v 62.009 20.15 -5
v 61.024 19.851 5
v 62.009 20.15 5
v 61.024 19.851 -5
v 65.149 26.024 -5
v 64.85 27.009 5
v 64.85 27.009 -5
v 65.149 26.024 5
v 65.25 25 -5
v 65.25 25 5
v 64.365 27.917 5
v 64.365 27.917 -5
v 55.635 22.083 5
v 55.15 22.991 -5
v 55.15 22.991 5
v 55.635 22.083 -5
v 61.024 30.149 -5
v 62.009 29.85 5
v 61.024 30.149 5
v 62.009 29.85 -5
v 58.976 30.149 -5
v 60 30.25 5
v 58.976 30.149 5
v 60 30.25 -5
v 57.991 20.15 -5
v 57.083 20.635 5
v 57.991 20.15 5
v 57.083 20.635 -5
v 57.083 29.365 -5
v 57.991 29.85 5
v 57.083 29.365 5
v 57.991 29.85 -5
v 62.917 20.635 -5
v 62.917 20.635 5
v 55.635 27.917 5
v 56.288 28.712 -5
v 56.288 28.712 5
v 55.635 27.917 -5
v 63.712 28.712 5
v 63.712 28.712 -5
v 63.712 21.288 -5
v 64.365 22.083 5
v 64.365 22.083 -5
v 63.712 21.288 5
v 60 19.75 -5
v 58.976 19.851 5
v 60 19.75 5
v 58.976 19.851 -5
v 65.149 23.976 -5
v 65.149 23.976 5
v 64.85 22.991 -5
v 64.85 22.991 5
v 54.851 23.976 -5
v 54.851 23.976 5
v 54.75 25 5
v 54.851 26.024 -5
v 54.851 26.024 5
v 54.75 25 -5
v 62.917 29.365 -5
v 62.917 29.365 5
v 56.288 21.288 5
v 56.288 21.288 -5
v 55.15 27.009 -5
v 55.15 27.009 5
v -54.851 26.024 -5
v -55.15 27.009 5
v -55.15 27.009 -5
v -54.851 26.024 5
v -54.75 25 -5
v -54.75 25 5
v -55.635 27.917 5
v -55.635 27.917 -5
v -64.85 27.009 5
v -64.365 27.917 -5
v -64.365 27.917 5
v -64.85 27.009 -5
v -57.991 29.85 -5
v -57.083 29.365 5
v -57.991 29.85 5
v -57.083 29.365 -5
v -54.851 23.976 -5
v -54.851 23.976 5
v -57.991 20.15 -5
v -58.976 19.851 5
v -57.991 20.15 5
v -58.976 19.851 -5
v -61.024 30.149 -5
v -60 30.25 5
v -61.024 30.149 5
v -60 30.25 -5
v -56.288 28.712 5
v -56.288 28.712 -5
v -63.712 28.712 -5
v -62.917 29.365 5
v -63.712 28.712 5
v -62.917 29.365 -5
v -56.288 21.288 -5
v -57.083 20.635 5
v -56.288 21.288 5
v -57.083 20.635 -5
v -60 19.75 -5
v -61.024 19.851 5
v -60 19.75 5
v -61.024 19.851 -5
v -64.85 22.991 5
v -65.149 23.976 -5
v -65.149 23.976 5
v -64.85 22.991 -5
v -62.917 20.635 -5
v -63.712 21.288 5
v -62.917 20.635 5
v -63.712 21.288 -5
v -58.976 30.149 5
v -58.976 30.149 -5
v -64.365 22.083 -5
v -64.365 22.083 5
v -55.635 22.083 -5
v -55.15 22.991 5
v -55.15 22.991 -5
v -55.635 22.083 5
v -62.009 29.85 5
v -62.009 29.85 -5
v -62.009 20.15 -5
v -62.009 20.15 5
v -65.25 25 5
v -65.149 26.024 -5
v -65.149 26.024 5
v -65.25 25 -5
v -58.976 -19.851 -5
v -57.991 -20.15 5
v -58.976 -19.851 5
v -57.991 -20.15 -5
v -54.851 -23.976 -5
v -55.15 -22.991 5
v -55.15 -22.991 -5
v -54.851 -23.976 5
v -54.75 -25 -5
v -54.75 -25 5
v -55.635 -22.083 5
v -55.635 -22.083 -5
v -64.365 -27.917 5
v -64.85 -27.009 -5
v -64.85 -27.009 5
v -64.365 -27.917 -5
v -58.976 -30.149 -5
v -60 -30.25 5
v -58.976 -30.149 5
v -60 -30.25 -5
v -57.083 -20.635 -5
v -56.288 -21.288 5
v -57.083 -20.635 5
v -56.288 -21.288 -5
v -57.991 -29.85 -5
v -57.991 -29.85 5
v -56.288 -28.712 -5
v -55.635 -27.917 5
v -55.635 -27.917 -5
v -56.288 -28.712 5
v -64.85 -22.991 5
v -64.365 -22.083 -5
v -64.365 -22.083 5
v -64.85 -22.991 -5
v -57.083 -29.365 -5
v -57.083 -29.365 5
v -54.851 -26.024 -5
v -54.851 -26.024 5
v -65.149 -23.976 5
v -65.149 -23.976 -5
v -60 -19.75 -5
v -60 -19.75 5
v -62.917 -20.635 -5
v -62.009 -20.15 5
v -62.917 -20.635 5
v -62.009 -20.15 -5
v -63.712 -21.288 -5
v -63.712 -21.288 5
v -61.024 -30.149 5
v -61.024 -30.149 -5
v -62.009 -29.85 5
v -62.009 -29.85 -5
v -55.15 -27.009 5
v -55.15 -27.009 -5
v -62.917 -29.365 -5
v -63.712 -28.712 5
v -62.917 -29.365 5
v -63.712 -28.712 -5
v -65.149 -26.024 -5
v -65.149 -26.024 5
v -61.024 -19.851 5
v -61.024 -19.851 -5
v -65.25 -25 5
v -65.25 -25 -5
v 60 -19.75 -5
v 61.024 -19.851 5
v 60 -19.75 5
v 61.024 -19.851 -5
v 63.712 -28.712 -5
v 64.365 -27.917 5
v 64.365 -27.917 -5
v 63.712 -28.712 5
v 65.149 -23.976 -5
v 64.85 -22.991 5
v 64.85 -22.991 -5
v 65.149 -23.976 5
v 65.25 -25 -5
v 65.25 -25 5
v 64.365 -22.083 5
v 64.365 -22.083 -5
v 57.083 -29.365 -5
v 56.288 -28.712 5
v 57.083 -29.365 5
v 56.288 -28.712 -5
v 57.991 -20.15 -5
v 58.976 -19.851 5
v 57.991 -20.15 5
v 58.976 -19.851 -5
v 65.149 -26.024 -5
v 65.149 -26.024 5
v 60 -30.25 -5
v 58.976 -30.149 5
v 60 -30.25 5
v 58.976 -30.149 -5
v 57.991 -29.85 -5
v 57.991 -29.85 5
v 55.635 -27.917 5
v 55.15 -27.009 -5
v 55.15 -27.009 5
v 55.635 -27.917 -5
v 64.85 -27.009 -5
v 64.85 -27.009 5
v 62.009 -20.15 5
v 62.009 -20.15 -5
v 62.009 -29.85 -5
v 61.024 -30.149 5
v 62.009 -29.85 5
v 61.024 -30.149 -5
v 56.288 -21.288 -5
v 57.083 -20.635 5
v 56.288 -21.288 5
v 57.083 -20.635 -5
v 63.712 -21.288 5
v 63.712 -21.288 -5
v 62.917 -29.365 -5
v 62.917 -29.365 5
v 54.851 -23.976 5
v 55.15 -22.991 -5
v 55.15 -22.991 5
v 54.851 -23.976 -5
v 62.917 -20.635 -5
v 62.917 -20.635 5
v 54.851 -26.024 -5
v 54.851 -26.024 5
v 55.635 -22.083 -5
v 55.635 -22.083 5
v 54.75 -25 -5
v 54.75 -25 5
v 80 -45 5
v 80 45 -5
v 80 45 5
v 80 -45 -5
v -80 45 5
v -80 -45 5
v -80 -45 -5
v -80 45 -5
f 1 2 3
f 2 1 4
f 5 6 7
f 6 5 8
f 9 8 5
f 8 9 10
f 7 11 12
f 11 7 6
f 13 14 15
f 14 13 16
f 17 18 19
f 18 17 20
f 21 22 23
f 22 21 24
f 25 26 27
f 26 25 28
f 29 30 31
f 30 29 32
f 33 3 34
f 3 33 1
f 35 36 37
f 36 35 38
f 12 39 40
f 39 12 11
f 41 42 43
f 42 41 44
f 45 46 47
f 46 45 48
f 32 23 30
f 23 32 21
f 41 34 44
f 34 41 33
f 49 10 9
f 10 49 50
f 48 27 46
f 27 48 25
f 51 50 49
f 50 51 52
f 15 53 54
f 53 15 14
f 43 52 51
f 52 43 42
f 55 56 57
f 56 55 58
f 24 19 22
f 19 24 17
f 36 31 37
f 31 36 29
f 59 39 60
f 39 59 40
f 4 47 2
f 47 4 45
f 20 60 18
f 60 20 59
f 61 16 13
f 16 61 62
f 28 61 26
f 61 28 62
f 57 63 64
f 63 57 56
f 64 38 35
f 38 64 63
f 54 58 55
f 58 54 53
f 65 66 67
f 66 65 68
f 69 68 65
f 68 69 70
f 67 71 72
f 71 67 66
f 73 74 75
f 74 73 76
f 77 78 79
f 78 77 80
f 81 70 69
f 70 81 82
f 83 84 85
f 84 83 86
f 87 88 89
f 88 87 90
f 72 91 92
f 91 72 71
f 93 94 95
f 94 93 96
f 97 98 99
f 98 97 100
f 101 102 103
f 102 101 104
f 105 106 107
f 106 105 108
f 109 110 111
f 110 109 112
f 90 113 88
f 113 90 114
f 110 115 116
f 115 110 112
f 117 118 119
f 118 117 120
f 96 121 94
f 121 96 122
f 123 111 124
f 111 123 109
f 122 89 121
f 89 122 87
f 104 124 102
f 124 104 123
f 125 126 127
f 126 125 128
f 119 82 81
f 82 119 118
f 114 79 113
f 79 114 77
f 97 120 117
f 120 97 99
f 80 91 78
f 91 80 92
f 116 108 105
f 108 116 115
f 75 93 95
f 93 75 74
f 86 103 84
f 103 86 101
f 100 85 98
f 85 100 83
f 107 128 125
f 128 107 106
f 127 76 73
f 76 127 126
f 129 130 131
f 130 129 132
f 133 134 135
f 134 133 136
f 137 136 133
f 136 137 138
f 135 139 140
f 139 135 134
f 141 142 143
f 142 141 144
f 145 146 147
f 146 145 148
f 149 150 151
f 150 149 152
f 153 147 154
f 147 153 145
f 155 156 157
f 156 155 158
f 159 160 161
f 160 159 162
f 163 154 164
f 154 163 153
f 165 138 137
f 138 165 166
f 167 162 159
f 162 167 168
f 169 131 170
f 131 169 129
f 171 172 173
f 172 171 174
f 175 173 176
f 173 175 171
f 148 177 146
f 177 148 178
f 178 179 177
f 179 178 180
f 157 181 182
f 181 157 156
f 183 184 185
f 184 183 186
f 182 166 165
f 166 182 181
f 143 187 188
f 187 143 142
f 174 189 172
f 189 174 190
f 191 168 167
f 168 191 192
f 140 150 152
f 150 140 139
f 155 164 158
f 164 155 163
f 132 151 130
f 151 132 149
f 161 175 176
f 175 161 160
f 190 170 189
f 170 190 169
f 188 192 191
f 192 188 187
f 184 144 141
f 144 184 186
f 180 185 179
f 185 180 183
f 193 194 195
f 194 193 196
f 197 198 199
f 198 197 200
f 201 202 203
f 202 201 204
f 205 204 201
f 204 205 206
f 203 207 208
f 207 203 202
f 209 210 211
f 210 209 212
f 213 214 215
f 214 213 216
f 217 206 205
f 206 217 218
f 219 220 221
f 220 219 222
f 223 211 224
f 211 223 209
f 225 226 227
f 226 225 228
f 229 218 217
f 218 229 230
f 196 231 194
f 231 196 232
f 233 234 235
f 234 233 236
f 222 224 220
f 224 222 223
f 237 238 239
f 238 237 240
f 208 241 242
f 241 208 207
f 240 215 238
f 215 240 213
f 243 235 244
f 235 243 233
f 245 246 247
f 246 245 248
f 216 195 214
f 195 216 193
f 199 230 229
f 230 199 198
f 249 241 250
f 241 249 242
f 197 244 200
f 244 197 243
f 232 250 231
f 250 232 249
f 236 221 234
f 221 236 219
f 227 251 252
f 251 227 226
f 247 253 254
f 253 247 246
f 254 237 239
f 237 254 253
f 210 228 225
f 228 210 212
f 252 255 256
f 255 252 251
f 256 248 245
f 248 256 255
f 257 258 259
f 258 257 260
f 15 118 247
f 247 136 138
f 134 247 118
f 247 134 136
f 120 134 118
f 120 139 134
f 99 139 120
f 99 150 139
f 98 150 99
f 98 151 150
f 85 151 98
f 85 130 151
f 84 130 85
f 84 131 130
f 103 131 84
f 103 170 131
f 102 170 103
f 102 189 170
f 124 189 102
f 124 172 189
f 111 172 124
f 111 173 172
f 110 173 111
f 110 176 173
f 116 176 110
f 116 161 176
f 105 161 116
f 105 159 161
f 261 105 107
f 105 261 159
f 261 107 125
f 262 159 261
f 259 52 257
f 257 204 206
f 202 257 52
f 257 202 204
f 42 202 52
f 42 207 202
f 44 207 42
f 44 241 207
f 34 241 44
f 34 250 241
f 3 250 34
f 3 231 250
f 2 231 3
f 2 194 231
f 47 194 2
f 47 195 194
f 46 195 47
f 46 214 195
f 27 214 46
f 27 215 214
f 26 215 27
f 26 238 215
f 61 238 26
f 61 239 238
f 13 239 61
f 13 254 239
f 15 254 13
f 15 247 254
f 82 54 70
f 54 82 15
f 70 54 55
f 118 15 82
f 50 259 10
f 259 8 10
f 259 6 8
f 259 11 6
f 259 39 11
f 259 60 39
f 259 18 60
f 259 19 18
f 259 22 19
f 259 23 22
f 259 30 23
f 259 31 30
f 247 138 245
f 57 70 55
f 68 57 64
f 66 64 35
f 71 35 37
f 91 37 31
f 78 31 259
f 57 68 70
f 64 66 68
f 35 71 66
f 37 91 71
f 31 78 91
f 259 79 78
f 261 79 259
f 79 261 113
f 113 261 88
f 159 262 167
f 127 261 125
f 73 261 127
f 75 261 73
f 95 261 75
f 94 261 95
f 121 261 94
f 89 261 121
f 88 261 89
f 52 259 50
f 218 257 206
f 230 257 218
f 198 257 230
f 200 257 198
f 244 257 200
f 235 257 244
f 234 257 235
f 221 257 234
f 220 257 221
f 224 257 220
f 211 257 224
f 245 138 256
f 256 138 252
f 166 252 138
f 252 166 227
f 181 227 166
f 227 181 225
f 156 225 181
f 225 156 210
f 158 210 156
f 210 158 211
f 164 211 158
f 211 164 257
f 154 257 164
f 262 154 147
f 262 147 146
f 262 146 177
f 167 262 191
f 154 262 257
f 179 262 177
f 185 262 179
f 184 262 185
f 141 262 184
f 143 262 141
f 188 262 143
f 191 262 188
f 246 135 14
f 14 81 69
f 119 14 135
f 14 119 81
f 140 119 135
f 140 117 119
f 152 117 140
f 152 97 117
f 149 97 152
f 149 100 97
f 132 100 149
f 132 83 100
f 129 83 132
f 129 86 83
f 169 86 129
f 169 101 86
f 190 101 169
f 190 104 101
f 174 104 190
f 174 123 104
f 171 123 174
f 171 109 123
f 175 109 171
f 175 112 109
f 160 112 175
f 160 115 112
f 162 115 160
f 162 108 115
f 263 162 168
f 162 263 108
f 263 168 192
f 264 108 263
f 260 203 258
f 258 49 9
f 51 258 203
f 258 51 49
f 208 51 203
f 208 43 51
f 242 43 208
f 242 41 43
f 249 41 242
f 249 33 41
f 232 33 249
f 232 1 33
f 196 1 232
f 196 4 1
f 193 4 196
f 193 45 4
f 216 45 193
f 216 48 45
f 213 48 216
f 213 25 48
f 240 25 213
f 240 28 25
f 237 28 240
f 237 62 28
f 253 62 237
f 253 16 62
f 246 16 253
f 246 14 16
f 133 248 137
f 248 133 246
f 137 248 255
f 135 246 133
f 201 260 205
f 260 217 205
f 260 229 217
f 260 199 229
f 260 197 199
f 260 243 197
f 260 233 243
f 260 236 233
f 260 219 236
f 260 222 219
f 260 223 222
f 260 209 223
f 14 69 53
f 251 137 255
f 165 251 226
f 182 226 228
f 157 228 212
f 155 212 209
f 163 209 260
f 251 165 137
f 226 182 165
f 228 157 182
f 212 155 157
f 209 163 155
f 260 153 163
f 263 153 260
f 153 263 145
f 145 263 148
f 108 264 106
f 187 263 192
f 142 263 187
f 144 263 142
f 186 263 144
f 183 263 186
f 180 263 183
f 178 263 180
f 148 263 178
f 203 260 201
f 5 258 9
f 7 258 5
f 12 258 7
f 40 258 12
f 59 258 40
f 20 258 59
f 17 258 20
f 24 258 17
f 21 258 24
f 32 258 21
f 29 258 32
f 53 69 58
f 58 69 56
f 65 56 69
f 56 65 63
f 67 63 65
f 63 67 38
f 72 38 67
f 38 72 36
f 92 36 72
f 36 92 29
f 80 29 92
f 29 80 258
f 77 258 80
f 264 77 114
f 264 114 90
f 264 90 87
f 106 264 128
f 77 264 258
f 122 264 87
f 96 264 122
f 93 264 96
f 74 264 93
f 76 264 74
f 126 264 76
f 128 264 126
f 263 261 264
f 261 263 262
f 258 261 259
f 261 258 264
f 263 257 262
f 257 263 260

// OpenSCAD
$fn = 32;

// ----------------------------------------------------------------------
// Corner plate 160 x 90 x 10
// 4 holes, centres taken from the edge offset
// ----------------------------------------------------------------------

// --- parameters (mm) ---
plate = [160, 90, 10];  // overall size (x, y, z)
holes = 4;              // number of holes the drawing asks for
hole_d = 10.5;          // hole diameter
edge = 20;              // hole centre offset from the plate edge

// --- derived feature positions (mm) ---
corner_x = plate[0] / 2 - edge;  // = 60   corner hole X
corner_y = plate[1] / 2 - edge;  // = 25   corner hole Y
feature_centers = [
  [corner_x, corner_y],
  [-corner_x, corner_y],
  [-corner_x, -corner_y],
  [corner_x, -corner_y]
];   // hole centres the loop below drills

// plate outline, every hole drilled through with the same cutters
difference() {
  cube(plate, center = true);
  for (centre = feature_centers)
    translate([centre[0], centre[1], 0])
      cylinder(d = hole_d, h = plate[2] + 2, center = true);
}
